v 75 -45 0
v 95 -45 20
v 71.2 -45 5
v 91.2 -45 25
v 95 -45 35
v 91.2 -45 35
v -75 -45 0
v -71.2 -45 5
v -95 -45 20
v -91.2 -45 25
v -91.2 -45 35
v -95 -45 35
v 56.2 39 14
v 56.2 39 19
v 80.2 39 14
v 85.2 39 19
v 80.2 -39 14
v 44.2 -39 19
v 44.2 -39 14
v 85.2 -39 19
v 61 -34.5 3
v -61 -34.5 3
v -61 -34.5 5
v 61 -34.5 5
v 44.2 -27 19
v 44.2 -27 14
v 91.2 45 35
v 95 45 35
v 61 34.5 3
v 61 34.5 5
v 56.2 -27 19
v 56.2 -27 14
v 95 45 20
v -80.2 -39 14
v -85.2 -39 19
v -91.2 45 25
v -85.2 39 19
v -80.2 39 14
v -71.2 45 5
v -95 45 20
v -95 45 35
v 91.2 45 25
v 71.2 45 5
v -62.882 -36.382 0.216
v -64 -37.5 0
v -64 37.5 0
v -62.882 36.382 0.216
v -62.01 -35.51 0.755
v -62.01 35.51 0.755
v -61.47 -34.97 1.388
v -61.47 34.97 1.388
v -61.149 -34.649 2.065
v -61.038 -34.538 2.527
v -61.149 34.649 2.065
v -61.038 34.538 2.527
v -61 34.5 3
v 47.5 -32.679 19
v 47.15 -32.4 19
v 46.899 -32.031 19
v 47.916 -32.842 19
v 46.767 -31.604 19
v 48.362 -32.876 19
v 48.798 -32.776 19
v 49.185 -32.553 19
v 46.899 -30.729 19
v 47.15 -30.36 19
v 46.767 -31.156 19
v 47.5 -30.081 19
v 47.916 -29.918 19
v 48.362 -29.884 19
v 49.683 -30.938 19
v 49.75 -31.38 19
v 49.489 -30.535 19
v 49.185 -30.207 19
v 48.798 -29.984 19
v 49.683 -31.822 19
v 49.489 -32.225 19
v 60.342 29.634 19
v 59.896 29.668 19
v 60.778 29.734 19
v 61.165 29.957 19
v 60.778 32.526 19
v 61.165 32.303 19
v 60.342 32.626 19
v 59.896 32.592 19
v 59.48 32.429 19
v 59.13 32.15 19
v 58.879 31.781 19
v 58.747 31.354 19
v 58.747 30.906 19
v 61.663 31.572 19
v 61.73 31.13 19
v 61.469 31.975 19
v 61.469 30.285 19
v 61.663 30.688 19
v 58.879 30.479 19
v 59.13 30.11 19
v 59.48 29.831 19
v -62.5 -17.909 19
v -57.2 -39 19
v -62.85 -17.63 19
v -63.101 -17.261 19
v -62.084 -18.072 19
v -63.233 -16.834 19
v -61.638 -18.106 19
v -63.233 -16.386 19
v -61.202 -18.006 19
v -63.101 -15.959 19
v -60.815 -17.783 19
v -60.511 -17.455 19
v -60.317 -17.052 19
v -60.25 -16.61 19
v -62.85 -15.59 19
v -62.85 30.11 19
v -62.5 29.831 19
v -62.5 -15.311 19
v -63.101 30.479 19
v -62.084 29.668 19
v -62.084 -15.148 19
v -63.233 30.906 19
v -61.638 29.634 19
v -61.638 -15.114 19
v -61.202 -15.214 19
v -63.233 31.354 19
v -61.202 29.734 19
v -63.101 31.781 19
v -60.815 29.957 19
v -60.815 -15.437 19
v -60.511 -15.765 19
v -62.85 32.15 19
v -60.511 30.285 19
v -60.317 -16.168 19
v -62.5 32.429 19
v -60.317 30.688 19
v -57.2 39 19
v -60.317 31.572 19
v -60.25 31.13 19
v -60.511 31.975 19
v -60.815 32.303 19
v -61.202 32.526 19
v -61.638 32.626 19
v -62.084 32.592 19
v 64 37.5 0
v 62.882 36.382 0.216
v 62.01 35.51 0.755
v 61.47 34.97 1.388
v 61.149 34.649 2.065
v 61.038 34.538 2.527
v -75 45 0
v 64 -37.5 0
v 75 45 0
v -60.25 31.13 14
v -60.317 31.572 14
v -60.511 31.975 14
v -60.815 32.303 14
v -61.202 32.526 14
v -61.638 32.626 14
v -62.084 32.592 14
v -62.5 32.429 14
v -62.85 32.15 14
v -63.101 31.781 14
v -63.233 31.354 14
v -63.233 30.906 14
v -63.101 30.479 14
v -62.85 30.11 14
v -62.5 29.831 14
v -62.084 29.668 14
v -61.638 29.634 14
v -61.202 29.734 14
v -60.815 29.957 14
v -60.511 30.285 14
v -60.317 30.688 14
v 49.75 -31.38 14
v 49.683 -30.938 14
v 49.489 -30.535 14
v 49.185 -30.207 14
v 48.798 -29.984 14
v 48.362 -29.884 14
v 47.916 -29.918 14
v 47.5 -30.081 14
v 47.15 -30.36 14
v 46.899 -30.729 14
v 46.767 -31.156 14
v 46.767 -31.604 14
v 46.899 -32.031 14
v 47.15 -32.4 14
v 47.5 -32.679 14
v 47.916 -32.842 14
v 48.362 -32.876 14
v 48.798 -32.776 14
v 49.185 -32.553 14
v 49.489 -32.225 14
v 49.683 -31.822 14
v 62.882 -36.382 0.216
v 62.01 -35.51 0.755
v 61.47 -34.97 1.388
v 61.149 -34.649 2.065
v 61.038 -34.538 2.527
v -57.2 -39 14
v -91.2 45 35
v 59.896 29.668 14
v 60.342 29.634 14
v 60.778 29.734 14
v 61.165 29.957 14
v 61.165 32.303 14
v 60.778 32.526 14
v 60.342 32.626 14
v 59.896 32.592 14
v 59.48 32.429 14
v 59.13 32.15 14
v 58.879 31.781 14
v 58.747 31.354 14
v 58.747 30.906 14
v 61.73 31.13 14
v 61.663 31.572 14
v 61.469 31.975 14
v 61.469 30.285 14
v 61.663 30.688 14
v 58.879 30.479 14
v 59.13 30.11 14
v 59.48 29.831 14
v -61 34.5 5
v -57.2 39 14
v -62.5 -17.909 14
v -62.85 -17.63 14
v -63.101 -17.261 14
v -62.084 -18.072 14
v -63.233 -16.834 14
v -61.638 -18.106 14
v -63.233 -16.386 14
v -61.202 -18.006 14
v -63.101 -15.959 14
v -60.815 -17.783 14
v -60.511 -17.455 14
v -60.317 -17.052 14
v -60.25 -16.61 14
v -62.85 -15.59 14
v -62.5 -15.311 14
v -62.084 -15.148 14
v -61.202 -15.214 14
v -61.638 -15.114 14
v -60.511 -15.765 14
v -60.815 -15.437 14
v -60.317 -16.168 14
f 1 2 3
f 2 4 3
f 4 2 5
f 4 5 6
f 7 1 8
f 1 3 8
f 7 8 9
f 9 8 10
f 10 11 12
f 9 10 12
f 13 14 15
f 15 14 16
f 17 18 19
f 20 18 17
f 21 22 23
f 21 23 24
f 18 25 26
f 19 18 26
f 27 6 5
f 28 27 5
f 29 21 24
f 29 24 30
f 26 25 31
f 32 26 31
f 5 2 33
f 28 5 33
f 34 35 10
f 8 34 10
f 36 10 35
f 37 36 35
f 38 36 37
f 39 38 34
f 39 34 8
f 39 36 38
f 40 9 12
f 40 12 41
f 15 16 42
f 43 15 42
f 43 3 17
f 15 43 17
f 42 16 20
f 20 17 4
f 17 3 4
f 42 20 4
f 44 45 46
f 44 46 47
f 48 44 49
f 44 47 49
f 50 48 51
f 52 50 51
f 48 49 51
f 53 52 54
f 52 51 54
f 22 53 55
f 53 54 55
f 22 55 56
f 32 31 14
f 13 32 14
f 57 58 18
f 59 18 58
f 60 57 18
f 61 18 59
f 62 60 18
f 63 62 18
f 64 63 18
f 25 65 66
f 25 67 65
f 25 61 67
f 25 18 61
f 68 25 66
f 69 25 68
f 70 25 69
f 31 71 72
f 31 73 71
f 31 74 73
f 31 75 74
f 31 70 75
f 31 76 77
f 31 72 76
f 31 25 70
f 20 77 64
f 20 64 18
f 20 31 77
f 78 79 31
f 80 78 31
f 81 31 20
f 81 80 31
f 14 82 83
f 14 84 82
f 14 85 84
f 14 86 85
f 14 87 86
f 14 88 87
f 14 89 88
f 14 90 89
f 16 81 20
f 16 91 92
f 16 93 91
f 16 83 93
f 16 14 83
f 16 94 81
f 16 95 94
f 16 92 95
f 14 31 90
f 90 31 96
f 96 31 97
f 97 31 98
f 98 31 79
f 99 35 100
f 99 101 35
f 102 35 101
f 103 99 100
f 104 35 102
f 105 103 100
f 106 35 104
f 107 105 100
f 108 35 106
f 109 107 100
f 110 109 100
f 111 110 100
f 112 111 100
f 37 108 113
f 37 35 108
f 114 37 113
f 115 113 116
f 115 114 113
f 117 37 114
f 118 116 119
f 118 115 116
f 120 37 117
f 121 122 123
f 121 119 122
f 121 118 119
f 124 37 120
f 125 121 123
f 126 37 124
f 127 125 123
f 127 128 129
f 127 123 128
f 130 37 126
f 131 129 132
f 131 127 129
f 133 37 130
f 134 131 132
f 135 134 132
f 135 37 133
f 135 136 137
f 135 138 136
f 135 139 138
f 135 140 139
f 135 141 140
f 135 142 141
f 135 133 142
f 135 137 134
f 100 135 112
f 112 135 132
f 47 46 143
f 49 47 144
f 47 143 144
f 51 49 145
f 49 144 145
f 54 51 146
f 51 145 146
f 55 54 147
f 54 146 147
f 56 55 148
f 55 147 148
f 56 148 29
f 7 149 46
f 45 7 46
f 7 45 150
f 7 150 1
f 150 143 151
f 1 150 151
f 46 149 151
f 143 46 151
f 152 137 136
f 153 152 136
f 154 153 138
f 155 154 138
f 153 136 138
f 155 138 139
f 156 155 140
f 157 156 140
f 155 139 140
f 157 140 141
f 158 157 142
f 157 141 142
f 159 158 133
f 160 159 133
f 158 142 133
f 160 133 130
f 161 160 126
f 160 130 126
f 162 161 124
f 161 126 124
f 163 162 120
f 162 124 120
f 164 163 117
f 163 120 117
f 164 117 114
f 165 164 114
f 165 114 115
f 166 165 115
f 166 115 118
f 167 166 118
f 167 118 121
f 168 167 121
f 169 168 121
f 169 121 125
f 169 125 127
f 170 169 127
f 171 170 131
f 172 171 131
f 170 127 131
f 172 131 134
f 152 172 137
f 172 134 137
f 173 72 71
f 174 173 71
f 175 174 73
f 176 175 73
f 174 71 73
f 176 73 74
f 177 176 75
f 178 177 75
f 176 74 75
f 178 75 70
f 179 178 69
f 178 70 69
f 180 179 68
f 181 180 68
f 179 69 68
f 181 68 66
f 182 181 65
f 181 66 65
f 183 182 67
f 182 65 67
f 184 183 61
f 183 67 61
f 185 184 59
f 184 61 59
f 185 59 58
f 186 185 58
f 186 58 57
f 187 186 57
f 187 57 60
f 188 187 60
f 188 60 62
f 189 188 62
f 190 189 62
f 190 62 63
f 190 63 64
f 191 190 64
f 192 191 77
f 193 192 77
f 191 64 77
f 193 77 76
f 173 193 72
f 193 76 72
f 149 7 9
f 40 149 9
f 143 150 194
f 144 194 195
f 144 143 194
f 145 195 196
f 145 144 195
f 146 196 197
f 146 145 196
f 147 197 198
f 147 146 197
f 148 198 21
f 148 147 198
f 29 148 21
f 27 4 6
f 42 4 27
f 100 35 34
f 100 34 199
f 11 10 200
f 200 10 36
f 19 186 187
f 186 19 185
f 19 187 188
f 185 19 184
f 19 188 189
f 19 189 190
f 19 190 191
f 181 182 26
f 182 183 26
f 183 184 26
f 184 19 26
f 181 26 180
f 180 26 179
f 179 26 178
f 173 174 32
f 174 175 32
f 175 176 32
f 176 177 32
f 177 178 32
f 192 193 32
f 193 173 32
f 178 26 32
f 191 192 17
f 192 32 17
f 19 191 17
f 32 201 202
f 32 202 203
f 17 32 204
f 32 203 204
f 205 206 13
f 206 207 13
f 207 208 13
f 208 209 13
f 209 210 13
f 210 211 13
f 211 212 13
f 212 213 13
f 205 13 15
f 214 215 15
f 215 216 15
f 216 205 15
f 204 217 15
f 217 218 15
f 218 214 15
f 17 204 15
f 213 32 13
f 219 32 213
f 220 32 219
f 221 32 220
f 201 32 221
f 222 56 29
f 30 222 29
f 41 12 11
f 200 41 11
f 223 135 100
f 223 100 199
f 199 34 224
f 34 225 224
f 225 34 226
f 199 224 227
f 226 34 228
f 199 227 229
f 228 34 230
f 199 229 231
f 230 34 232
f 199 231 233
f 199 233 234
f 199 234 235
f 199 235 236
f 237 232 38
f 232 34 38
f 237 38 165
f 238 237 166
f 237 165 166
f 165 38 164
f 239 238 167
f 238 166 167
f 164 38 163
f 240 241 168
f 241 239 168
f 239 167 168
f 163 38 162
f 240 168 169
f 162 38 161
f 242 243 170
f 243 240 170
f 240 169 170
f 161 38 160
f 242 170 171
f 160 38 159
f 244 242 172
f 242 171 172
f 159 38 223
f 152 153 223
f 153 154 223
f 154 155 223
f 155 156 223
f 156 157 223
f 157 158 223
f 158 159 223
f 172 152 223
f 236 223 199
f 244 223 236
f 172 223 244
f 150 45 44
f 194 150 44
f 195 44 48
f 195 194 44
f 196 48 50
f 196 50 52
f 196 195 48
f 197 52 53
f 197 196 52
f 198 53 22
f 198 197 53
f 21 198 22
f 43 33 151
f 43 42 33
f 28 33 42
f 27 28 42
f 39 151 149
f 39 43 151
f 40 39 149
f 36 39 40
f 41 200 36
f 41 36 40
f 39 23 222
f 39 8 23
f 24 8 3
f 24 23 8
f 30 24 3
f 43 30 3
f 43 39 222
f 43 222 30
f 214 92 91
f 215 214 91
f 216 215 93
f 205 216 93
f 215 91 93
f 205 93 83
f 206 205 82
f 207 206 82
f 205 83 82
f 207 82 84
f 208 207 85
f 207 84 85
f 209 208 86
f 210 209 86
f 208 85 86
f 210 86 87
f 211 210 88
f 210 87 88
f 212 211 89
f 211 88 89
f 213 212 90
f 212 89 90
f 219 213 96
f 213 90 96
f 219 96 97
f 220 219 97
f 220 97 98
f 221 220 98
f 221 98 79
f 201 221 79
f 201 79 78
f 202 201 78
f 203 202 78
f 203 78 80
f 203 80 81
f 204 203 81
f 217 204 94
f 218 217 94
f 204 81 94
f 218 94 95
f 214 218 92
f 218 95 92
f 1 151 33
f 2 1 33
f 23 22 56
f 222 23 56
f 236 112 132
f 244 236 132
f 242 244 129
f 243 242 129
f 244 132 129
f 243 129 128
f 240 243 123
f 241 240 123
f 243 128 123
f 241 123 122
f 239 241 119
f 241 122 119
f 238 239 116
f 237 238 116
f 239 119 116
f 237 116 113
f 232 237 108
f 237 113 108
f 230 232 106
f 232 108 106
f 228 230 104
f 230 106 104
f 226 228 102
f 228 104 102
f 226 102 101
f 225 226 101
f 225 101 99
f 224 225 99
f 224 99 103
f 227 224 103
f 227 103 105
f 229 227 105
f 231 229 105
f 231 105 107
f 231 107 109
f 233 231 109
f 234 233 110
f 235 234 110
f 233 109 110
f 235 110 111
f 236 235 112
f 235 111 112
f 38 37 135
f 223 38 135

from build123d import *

# Parameters (mm, degrees)
SKETCH1_W           = 190
SKETCH1_H           = 90
SKETCH1_W_2         = 122
SKETCH1_H_2         = 69
BOSS_EXTRUDE1_DEPTH = 5
SKETCH2_W           = 3.8
SKETCH2_H           = 90
BOSS_EXTRUDE2_DEPTH = 30
SKETCH3_W           = 34
SKETCH3_H           = 5
SKETCH3_W_2         = 47
BOSS_EXTRUDE3_DEPTH = 90
SKETCH4_W           = 182.4
SKETCH4_H           = 6
CUT_EXTRUDE1_DEPTH  = 5
SKETCH5_R           = 1.5
CUT_EXTRUDE2_DEPTH  = 5
SKETCH6_W           = 12
SKETCH6_H           = 66
CUT_EXTRUDE3_DEPTH  = 5
FILLET3_R           = 3
CHAMFER6_SIZE       = 20


with BuildPart() as part:
    # Sketch1 → Boss-Extrude1 (new body)
    with BuildSketch(Plane.XY):
        Rectangle(SKETCH1_W, SKETCH1_H)
        Rectangle(SKETCH1_W_2, SKETCH1_H_2, mode=Mode.SUBTRACT)
    extrude(amount=BOSS_EXTRUDE1_DEPTH)

    # Sketch2 → Boss-Extrude2 (add)
    with BuildSketch(Plane.XY.offset(5)):
        with Locations((-93.1, 0)):
            Rectangle(SKETCH2_W, SKETCH2_H)
        with Locations((93.1, 0)):
            Rectangle(SKETCH2_W, SKETCH2_H)
    extrude(amount=BOSS_EXTRUDE2_DEPTH)

    # Sketch3 → Boss-Extrude3 (add)
    with BuildSketch(Plane(origin=(0, 45, 0), x_dir=(1, 0, 0), z_dir=(0, 1, 0))):
        with Locations((-74.2, -16.5)):
            Rectangle(SKETCH3_W, SKETCH3_H)
        with Locations((67.7, -16.5)):
            Rectangle(SKETCH3_W_2, SKETCH3_H)
    extrude(amount=-BOSS_EXTRUDE3_DEPTH)

    # Sketch4 → Cut-Extrude1 (cut)
    with BuildSketch(Plane.XY.offset(19)):
        with Locations((0, 42)):
            Rectangle(SKETCH4_W, SKETCH4_H)
        with Locations((0, -42)):
            Rectangle(SKETCH4_W, SKETCH4_H)
    extrude(amount=-CUT_EXTRUDE1_DEPTH, mode=Mode.SUBTRACT)

    # Sketch5 → Cut-Extrude2 (cut)
    with BuildSketch(Plane.XY.offset(19)):
        with Locations((-61.75, 31.13)):
            Circle(SKETCH5_R)
        with Locations((-61.75, -16.61)):
            Circle(SKETCH5_R)
        with Locations((60.23, 31.13)):
            Circle(SKETCH5_R)
        with Locations((48.25, -31.38)):
            Circle(SKETCH5_R)
    extrude(amount=-CUT_EXTRUDE2_DEPTH, mode=Mode.SUBTRACT)

    # Sketch6 → Cut-Extrude3 (cut)
    with BuildSketch(Plane.XY.offset(19)):
        with Locations((50.2, 6)):
            Rectangle(SKETCH6_W, SKETCH6_H)
    extrude(amount=-CUT_EXTRUDE3_DEPTH, mode=Mode.SUBTRACT)

    # Fillet3
    fillet3_edges = [part.edges().sort_by_distance(p)[0] for p in [
        (61, 0, 0),
        (0, 34.5, 0),
        (-61, 0, 0),
        (0, -34.5, 0),
    ]]
    fillet(fillet3_edges, radius=FILLET3_R)

    # Chamfer6
    # the kernel refuses this chamfer: 20 mm, written as the material it adds along each edge
    with BuildSketch(Plane(origin=(-91.2, 45, 5), x_dir=(-0.027495876610586317, 0, 0.9996219169112968), z_dir=(0, -1, 0))) as chamfer6_piece_1:
        Polygon((CHAMFER6_SIZE * 0.999621916911, -CHAMFER6_SIZE * 0.0274958766106), (-CHAMFER6_SIZE * 0.0274958766106, -CHAMFER6_SIZE * 0.999621916911), (0, 0), align=None)
    extrude(amount=90)
    with BuildSketch(Plane(origin=(91.2, -45, 5), x_dir=(-0.9996219169112968, 0, -0.02749587661058636), z_dir=(0, 1, 0))) as chamfer6_piece_2:
        Polygon((CHAMFER6_SIZE * 0.999621916911, CHAMFER6_SIZE * 0.0274958766106), (-CHAMFER6_SIZE * 0.0274958766106, CHAMFER6_SIZE * 0.999621916911), (0, 0), align=None)
    extrude(amount=90)
    # the kernel refuses this chamfer: 20 mm, written as the material it takes off along each edge
    with BuildSketch(Plane(origin=(-95, -96.433659759, 0), x_dir=(0.9996219169112968, 0, -0.027495876610586372), z_dir=(0, 1, 0)), Plane(origin=(95, 96.433659759, 0), x_dir=(-0.9996219169112968, 0, -0.027495876610586372), z_dir=(0, -1, 0))) as chamfer6_2_piece_1:
        Polygon((CHAMFER6_SIZE * 0.999621916911, -CHAMFER6_SIZE * 0.0274958766106), (-CHAMFER6_SIZE * 0.0274958766106, -CHAMFER6_SIZE * 0.999621916911), (0, 0), align=None)
    extrude(amount=192.867319519, mode=Mode.SUBTRACT)


solid = part.part
